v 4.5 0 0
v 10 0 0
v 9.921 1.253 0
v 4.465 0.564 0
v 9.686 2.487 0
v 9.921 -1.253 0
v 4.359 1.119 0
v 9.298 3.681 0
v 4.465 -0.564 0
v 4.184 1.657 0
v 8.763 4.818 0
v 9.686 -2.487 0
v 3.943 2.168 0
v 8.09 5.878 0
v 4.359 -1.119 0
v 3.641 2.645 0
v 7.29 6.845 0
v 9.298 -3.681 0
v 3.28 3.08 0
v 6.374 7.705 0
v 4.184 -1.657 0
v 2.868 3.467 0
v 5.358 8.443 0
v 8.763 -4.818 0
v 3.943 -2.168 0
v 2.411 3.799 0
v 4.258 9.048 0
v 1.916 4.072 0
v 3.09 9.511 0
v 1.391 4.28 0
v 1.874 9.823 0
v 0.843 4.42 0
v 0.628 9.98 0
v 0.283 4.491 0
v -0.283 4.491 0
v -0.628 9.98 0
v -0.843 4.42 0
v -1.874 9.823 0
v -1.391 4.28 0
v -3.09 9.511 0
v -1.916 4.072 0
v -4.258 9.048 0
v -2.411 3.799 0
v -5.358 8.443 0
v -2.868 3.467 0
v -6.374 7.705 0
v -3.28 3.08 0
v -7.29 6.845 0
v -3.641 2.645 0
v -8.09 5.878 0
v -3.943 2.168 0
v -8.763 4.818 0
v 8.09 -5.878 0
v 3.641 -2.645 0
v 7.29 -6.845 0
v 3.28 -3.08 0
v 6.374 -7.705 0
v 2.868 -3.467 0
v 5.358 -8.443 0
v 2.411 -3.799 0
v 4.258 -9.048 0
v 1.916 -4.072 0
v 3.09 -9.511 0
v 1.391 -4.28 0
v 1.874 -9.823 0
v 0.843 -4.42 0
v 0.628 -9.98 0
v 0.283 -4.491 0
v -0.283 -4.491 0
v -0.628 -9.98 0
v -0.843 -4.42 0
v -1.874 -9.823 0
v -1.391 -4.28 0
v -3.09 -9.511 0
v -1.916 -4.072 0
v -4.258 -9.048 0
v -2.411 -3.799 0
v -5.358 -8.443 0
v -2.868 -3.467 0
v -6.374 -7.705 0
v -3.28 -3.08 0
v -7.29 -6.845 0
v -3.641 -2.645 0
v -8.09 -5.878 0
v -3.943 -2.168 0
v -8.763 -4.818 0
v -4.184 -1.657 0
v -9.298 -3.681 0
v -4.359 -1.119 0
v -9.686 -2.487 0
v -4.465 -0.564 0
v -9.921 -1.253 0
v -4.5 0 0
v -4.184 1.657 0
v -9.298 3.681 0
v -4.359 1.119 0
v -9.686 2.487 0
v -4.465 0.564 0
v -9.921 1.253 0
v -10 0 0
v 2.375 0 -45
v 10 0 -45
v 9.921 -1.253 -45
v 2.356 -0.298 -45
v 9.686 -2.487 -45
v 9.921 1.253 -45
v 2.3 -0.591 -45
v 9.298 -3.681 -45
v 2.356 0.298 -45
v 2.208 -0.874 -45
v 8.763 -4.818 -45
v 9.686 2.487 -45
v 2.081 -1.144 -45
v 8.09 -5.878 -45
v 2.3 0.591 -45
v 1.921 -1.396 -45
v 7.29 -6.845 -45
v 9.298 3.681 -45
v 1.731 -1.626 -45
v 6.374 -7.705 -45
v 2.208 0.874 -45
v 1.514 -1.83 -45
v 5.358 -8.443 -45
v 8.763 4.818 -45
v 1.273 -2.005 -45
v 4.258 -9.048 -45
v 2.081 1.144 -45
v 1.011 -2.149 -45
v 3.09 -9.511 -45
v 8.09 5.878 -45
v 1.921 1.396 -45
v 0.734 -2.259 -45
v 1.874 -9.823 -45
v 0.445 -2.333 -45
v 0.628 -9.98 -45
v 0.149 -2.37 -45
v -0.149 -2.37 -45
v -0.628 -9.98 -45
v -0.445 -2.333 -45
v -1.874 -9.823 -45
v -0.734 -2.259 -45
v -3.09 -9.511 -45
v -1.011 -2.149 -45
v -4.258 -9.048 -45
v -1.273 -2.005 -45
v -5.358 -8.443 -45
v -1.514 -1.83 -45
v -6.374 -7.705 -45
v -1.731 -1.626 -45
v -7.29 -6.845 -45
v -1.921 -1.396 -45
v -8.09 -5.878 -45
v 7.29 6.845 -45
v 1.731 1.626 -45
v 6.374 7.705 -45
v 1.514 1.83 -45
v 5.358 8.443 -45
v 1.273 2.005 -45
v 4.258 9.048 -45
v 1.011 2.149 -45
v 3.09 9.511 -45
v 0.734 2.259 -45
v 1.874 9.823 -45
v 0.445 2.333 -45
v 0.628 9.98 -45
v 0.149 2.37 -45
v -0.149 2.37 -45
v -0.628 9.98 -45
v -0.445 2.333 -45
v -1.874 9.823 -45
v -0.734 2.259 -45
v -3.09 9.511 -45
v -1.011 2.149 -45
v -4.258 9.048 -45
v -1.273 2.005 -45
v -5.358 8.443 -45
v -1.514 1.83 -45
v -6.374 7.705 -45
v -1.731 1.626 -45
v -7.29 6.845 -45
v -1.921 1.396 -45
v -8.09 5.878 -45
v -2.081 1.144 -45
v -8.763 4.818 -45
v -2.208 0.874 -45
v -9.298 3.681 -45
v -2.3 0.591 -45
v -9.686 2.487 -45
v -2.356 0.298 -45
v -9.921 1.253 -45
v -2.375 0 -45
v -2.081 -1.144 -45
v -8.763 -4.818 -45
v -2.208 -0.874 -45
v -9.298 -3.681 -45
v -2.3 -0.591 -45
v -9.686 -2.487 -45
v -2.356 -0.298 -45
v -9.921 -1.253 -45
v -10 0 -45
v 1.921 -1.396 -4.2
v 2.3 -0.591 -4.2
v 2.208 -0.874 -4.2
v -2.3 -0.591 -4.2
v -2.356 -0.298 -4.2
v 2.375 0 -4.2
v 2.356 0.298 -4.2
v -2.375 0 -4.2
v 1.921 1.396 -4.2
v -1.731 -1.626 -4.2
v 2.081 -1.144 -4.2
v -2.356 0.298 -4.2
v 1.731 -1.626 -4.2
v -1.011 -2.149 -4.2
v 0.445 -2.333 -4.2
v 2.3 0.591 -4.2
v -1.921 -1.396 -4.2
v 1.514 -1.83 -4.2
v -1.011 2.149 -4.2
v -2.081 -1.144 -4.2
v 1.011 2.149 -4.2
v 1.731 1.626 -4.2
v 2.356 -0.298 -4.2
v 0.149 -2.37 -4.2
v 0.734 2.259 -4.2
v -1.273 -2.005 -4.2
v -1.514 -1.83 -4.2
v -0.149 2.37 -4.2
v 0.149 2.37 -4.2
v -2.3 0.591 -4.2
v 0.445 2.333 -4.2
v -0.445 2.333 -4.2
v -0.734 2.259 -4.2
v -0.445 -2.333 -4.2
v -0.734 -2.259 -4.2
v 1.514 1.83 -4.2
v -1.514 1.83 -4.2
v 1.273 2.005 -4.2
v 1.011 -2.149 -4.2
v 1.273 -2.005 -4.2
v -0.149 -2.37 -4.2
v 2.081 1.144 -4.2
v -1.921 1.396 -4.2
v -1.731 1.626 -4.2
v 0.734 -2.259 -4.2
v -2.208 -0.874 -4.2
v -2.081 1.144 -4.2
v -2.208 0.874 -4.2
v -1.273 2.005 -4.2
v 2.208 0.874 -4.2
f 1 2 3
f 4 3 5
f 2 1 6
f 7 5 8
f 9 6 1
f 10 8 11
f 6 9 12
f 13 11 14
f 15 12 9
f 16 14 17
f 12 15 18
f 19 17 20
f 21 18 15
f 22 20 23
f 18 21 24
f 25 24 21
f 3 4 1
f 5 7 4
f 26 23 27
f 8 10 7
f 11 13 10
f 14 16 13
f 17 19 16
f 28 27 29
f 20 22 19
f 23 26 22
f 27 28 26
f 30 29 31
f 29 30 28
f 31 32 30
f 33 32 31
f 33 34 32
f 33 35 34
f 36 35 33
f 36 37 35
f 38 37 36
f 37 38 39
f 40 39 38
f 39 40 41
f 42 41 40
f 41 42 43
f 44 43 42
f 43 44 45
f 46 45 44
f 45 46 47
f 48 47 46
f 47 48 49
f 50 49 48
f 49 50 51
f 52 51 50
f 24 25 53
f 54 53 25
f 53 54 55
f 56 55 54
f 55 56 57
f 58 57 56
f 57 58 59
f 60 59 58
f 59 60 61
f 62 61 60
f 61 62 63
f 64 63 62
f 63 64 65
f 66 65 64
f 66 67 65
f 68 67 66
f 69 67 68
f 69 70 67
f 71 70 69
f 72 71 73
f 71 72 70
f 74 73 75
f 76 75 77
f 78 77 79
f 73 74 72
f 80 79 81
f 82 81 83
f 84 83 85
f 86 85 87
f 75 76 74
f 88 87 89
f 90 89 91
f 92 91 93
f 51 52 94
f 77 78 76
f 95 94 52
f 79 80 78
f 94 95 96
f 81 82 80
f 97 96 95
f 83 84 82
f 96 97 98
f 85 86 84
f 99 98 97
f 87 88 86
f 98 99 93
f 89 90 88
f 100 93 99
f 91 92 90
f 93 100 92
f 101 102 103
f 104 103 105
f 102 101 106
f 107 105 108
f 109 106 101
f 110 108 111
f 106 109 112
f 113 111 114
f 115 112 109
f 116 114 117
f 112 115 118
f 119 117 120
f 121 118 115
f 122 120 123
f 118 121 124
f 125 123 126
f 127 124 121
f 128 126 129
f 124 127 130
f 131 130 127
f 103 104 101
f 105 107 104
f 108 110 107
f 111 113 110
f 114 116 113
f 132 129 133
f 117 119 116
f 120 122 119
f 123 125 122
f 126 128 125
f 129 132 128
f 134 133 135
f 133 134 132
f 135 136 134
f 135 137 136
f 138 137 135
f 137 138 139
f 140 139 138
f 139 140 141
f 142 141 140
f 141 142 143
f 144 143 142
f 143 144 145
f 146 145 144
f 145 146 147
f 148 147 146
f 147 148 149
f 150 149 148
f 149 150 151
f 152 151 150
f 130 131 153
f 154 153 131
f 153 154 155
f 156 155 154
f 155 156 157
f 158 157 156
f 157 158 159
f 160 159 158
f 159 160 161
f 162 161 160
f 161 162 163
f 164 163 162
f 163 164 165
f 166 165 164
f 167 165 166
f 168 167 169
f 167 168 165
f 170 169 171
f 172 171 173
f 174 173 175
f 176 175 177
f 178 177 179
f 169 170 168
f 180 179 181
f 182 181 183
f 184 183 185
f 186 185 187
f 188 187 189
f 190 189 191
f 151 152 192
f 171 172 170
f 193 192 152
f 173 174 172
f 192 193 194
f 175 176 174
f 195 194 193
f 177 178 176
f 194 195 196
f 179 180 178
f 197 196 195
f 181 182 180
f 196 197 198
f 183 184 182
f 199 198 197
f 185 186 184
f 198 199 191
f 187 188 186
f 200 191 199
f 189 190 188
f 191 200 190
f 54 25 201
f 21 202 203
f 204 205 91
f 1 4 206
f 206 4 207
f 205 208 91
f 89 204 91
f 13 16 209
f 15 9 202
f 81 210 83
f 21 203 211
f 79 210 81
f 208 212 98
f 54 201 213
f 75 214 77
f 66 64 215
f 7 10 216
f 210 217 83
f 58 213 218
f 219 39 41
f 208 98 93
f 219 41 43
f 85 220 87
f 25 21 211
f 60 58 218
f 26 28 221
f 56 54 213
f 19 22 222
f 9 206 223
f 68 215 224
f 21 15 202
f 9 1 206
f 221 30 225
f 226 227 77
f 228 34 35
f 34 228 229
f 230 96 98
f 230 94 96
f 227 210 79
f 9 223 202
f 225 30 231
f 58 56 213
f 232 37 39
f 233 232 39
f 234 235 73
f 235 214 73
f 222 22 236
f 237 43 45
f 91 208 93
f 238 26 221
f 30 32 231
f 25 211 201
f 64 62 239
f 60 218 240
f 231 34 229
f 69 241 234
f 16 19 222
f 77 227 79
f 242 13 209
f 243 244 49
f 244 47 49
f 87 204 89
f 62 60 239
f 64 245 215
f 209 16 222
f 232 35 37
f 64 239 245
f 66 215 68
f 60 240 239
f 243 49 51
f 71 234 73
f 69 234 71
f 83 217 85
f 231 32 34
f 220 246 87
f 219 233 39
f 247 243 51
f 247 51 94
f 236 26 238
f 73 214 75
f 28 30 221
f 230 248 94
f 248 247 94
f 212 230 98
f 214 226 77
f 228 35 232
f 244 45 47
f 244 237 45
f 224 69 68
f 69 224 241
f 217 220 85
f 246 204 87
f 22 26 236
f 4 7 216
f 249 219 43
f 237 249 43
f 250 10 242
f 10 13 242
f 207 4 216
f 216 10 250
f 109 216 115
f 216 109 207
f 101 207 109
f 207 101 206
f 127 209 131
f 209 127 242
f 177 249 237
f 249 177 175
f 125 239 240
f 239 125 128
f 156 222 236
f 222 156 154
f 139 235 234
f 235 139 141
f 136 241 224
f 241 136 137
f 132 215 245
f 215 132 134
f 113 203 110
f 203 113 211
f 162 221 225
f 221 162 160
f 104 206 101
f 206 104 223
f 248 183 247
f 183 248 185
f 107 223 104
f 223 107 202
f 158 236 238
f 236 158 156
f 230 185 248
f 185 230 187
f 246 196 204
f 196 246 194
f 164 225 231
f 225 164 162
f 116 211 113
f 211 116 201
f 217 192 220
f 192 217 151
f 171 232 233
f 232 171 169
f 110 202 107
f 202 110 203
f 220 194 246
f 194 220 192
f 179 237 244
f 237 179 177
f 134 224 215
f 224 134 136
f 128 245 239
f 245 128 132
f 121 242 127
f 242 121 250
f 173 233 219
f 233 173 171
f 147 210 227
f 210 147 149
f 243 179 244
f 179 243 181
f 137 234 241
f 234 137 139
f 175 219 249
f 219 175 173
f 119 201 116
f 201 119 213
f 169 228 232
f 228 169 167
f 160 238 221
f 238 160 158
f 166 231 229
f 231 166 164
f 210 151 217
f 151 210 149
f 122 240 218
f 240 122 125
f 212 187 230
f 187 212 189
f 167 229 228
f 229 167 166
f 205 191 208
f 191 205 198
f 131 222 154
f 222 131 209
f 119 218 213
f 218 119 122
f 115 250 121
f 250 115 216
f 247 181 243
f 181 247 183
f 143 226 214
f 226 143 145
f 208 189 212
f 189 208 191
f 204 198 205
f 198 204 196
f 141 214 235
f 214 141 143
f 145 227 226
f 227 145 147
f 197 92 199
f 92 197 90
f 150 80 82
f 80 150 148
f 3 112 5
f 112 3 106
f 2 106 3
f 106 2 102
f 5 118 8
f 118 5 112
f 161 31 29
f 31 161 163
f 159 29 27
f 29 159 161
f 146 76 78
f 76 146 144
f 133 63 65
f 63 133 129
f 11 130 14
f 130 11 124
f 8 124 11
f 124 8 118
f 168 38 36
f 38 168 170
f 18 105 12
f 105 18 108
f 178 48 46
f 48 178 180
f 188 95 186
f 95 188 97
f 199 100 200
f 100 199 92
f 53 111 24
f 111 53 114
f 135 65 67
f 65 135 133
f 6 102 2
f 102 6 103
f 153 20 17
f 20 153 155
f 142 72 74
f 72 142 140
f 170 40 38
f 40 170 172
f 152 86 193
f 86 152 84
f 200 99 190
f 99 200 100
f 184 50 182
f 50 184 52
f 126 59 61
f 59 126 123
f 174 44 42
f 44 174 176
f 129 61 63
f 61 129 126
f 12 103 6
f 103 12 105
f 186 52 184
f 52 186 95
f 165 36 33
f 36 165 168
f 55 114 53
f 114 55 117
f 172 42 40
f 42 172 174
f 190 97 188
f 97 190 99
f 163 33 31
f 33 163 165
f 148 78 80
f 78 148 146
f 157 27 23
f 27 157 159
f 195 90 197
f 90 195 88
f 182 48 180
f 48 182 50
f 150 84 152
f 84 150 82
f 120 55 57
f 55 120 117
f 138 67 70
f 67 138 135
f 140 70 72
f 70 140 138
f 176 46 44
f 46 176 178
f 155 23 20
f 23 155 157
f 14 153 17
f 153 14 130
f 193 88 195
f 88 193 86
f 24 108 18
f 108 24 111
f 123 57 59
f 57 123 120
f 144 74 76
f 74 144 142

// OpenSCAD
$fn = 50;


difference() {
	union() {
		translate(v = [0, 0, -45.0000000000]) {
			cylinder(h = 45, r = 10.0000000000);
		}
		cylinder(h = 0, r = 16.0000000000);
	}
	union() {
		translate(v = [0, 0, 0]) {
			rotate(a = [0, 0, 0]) {
				difference() {
					union() {
						#translate(v = [0, 0, -45.0000000000]) {
							cylinder(h = 45, r = 2.2500000000);
						}
						#translate(v = [0, 0, -4.2000000000]) {
							cylinder(h = 4.2000000000, r = 10.0000000000, r1 = 2.3750000000, r2 = 4.5000000000);
						}
						#translate(v = [0, 0, -45.0000000000]) {
							cylinder(h = 45, r = 2.3750000000);
						}
						#translate(v = [0, 0, -45.0000000000]) {
							cylinder(h = 45, r = 2.2500000000);
						}
					}
					union();
				}
			}
		}
	}
}
